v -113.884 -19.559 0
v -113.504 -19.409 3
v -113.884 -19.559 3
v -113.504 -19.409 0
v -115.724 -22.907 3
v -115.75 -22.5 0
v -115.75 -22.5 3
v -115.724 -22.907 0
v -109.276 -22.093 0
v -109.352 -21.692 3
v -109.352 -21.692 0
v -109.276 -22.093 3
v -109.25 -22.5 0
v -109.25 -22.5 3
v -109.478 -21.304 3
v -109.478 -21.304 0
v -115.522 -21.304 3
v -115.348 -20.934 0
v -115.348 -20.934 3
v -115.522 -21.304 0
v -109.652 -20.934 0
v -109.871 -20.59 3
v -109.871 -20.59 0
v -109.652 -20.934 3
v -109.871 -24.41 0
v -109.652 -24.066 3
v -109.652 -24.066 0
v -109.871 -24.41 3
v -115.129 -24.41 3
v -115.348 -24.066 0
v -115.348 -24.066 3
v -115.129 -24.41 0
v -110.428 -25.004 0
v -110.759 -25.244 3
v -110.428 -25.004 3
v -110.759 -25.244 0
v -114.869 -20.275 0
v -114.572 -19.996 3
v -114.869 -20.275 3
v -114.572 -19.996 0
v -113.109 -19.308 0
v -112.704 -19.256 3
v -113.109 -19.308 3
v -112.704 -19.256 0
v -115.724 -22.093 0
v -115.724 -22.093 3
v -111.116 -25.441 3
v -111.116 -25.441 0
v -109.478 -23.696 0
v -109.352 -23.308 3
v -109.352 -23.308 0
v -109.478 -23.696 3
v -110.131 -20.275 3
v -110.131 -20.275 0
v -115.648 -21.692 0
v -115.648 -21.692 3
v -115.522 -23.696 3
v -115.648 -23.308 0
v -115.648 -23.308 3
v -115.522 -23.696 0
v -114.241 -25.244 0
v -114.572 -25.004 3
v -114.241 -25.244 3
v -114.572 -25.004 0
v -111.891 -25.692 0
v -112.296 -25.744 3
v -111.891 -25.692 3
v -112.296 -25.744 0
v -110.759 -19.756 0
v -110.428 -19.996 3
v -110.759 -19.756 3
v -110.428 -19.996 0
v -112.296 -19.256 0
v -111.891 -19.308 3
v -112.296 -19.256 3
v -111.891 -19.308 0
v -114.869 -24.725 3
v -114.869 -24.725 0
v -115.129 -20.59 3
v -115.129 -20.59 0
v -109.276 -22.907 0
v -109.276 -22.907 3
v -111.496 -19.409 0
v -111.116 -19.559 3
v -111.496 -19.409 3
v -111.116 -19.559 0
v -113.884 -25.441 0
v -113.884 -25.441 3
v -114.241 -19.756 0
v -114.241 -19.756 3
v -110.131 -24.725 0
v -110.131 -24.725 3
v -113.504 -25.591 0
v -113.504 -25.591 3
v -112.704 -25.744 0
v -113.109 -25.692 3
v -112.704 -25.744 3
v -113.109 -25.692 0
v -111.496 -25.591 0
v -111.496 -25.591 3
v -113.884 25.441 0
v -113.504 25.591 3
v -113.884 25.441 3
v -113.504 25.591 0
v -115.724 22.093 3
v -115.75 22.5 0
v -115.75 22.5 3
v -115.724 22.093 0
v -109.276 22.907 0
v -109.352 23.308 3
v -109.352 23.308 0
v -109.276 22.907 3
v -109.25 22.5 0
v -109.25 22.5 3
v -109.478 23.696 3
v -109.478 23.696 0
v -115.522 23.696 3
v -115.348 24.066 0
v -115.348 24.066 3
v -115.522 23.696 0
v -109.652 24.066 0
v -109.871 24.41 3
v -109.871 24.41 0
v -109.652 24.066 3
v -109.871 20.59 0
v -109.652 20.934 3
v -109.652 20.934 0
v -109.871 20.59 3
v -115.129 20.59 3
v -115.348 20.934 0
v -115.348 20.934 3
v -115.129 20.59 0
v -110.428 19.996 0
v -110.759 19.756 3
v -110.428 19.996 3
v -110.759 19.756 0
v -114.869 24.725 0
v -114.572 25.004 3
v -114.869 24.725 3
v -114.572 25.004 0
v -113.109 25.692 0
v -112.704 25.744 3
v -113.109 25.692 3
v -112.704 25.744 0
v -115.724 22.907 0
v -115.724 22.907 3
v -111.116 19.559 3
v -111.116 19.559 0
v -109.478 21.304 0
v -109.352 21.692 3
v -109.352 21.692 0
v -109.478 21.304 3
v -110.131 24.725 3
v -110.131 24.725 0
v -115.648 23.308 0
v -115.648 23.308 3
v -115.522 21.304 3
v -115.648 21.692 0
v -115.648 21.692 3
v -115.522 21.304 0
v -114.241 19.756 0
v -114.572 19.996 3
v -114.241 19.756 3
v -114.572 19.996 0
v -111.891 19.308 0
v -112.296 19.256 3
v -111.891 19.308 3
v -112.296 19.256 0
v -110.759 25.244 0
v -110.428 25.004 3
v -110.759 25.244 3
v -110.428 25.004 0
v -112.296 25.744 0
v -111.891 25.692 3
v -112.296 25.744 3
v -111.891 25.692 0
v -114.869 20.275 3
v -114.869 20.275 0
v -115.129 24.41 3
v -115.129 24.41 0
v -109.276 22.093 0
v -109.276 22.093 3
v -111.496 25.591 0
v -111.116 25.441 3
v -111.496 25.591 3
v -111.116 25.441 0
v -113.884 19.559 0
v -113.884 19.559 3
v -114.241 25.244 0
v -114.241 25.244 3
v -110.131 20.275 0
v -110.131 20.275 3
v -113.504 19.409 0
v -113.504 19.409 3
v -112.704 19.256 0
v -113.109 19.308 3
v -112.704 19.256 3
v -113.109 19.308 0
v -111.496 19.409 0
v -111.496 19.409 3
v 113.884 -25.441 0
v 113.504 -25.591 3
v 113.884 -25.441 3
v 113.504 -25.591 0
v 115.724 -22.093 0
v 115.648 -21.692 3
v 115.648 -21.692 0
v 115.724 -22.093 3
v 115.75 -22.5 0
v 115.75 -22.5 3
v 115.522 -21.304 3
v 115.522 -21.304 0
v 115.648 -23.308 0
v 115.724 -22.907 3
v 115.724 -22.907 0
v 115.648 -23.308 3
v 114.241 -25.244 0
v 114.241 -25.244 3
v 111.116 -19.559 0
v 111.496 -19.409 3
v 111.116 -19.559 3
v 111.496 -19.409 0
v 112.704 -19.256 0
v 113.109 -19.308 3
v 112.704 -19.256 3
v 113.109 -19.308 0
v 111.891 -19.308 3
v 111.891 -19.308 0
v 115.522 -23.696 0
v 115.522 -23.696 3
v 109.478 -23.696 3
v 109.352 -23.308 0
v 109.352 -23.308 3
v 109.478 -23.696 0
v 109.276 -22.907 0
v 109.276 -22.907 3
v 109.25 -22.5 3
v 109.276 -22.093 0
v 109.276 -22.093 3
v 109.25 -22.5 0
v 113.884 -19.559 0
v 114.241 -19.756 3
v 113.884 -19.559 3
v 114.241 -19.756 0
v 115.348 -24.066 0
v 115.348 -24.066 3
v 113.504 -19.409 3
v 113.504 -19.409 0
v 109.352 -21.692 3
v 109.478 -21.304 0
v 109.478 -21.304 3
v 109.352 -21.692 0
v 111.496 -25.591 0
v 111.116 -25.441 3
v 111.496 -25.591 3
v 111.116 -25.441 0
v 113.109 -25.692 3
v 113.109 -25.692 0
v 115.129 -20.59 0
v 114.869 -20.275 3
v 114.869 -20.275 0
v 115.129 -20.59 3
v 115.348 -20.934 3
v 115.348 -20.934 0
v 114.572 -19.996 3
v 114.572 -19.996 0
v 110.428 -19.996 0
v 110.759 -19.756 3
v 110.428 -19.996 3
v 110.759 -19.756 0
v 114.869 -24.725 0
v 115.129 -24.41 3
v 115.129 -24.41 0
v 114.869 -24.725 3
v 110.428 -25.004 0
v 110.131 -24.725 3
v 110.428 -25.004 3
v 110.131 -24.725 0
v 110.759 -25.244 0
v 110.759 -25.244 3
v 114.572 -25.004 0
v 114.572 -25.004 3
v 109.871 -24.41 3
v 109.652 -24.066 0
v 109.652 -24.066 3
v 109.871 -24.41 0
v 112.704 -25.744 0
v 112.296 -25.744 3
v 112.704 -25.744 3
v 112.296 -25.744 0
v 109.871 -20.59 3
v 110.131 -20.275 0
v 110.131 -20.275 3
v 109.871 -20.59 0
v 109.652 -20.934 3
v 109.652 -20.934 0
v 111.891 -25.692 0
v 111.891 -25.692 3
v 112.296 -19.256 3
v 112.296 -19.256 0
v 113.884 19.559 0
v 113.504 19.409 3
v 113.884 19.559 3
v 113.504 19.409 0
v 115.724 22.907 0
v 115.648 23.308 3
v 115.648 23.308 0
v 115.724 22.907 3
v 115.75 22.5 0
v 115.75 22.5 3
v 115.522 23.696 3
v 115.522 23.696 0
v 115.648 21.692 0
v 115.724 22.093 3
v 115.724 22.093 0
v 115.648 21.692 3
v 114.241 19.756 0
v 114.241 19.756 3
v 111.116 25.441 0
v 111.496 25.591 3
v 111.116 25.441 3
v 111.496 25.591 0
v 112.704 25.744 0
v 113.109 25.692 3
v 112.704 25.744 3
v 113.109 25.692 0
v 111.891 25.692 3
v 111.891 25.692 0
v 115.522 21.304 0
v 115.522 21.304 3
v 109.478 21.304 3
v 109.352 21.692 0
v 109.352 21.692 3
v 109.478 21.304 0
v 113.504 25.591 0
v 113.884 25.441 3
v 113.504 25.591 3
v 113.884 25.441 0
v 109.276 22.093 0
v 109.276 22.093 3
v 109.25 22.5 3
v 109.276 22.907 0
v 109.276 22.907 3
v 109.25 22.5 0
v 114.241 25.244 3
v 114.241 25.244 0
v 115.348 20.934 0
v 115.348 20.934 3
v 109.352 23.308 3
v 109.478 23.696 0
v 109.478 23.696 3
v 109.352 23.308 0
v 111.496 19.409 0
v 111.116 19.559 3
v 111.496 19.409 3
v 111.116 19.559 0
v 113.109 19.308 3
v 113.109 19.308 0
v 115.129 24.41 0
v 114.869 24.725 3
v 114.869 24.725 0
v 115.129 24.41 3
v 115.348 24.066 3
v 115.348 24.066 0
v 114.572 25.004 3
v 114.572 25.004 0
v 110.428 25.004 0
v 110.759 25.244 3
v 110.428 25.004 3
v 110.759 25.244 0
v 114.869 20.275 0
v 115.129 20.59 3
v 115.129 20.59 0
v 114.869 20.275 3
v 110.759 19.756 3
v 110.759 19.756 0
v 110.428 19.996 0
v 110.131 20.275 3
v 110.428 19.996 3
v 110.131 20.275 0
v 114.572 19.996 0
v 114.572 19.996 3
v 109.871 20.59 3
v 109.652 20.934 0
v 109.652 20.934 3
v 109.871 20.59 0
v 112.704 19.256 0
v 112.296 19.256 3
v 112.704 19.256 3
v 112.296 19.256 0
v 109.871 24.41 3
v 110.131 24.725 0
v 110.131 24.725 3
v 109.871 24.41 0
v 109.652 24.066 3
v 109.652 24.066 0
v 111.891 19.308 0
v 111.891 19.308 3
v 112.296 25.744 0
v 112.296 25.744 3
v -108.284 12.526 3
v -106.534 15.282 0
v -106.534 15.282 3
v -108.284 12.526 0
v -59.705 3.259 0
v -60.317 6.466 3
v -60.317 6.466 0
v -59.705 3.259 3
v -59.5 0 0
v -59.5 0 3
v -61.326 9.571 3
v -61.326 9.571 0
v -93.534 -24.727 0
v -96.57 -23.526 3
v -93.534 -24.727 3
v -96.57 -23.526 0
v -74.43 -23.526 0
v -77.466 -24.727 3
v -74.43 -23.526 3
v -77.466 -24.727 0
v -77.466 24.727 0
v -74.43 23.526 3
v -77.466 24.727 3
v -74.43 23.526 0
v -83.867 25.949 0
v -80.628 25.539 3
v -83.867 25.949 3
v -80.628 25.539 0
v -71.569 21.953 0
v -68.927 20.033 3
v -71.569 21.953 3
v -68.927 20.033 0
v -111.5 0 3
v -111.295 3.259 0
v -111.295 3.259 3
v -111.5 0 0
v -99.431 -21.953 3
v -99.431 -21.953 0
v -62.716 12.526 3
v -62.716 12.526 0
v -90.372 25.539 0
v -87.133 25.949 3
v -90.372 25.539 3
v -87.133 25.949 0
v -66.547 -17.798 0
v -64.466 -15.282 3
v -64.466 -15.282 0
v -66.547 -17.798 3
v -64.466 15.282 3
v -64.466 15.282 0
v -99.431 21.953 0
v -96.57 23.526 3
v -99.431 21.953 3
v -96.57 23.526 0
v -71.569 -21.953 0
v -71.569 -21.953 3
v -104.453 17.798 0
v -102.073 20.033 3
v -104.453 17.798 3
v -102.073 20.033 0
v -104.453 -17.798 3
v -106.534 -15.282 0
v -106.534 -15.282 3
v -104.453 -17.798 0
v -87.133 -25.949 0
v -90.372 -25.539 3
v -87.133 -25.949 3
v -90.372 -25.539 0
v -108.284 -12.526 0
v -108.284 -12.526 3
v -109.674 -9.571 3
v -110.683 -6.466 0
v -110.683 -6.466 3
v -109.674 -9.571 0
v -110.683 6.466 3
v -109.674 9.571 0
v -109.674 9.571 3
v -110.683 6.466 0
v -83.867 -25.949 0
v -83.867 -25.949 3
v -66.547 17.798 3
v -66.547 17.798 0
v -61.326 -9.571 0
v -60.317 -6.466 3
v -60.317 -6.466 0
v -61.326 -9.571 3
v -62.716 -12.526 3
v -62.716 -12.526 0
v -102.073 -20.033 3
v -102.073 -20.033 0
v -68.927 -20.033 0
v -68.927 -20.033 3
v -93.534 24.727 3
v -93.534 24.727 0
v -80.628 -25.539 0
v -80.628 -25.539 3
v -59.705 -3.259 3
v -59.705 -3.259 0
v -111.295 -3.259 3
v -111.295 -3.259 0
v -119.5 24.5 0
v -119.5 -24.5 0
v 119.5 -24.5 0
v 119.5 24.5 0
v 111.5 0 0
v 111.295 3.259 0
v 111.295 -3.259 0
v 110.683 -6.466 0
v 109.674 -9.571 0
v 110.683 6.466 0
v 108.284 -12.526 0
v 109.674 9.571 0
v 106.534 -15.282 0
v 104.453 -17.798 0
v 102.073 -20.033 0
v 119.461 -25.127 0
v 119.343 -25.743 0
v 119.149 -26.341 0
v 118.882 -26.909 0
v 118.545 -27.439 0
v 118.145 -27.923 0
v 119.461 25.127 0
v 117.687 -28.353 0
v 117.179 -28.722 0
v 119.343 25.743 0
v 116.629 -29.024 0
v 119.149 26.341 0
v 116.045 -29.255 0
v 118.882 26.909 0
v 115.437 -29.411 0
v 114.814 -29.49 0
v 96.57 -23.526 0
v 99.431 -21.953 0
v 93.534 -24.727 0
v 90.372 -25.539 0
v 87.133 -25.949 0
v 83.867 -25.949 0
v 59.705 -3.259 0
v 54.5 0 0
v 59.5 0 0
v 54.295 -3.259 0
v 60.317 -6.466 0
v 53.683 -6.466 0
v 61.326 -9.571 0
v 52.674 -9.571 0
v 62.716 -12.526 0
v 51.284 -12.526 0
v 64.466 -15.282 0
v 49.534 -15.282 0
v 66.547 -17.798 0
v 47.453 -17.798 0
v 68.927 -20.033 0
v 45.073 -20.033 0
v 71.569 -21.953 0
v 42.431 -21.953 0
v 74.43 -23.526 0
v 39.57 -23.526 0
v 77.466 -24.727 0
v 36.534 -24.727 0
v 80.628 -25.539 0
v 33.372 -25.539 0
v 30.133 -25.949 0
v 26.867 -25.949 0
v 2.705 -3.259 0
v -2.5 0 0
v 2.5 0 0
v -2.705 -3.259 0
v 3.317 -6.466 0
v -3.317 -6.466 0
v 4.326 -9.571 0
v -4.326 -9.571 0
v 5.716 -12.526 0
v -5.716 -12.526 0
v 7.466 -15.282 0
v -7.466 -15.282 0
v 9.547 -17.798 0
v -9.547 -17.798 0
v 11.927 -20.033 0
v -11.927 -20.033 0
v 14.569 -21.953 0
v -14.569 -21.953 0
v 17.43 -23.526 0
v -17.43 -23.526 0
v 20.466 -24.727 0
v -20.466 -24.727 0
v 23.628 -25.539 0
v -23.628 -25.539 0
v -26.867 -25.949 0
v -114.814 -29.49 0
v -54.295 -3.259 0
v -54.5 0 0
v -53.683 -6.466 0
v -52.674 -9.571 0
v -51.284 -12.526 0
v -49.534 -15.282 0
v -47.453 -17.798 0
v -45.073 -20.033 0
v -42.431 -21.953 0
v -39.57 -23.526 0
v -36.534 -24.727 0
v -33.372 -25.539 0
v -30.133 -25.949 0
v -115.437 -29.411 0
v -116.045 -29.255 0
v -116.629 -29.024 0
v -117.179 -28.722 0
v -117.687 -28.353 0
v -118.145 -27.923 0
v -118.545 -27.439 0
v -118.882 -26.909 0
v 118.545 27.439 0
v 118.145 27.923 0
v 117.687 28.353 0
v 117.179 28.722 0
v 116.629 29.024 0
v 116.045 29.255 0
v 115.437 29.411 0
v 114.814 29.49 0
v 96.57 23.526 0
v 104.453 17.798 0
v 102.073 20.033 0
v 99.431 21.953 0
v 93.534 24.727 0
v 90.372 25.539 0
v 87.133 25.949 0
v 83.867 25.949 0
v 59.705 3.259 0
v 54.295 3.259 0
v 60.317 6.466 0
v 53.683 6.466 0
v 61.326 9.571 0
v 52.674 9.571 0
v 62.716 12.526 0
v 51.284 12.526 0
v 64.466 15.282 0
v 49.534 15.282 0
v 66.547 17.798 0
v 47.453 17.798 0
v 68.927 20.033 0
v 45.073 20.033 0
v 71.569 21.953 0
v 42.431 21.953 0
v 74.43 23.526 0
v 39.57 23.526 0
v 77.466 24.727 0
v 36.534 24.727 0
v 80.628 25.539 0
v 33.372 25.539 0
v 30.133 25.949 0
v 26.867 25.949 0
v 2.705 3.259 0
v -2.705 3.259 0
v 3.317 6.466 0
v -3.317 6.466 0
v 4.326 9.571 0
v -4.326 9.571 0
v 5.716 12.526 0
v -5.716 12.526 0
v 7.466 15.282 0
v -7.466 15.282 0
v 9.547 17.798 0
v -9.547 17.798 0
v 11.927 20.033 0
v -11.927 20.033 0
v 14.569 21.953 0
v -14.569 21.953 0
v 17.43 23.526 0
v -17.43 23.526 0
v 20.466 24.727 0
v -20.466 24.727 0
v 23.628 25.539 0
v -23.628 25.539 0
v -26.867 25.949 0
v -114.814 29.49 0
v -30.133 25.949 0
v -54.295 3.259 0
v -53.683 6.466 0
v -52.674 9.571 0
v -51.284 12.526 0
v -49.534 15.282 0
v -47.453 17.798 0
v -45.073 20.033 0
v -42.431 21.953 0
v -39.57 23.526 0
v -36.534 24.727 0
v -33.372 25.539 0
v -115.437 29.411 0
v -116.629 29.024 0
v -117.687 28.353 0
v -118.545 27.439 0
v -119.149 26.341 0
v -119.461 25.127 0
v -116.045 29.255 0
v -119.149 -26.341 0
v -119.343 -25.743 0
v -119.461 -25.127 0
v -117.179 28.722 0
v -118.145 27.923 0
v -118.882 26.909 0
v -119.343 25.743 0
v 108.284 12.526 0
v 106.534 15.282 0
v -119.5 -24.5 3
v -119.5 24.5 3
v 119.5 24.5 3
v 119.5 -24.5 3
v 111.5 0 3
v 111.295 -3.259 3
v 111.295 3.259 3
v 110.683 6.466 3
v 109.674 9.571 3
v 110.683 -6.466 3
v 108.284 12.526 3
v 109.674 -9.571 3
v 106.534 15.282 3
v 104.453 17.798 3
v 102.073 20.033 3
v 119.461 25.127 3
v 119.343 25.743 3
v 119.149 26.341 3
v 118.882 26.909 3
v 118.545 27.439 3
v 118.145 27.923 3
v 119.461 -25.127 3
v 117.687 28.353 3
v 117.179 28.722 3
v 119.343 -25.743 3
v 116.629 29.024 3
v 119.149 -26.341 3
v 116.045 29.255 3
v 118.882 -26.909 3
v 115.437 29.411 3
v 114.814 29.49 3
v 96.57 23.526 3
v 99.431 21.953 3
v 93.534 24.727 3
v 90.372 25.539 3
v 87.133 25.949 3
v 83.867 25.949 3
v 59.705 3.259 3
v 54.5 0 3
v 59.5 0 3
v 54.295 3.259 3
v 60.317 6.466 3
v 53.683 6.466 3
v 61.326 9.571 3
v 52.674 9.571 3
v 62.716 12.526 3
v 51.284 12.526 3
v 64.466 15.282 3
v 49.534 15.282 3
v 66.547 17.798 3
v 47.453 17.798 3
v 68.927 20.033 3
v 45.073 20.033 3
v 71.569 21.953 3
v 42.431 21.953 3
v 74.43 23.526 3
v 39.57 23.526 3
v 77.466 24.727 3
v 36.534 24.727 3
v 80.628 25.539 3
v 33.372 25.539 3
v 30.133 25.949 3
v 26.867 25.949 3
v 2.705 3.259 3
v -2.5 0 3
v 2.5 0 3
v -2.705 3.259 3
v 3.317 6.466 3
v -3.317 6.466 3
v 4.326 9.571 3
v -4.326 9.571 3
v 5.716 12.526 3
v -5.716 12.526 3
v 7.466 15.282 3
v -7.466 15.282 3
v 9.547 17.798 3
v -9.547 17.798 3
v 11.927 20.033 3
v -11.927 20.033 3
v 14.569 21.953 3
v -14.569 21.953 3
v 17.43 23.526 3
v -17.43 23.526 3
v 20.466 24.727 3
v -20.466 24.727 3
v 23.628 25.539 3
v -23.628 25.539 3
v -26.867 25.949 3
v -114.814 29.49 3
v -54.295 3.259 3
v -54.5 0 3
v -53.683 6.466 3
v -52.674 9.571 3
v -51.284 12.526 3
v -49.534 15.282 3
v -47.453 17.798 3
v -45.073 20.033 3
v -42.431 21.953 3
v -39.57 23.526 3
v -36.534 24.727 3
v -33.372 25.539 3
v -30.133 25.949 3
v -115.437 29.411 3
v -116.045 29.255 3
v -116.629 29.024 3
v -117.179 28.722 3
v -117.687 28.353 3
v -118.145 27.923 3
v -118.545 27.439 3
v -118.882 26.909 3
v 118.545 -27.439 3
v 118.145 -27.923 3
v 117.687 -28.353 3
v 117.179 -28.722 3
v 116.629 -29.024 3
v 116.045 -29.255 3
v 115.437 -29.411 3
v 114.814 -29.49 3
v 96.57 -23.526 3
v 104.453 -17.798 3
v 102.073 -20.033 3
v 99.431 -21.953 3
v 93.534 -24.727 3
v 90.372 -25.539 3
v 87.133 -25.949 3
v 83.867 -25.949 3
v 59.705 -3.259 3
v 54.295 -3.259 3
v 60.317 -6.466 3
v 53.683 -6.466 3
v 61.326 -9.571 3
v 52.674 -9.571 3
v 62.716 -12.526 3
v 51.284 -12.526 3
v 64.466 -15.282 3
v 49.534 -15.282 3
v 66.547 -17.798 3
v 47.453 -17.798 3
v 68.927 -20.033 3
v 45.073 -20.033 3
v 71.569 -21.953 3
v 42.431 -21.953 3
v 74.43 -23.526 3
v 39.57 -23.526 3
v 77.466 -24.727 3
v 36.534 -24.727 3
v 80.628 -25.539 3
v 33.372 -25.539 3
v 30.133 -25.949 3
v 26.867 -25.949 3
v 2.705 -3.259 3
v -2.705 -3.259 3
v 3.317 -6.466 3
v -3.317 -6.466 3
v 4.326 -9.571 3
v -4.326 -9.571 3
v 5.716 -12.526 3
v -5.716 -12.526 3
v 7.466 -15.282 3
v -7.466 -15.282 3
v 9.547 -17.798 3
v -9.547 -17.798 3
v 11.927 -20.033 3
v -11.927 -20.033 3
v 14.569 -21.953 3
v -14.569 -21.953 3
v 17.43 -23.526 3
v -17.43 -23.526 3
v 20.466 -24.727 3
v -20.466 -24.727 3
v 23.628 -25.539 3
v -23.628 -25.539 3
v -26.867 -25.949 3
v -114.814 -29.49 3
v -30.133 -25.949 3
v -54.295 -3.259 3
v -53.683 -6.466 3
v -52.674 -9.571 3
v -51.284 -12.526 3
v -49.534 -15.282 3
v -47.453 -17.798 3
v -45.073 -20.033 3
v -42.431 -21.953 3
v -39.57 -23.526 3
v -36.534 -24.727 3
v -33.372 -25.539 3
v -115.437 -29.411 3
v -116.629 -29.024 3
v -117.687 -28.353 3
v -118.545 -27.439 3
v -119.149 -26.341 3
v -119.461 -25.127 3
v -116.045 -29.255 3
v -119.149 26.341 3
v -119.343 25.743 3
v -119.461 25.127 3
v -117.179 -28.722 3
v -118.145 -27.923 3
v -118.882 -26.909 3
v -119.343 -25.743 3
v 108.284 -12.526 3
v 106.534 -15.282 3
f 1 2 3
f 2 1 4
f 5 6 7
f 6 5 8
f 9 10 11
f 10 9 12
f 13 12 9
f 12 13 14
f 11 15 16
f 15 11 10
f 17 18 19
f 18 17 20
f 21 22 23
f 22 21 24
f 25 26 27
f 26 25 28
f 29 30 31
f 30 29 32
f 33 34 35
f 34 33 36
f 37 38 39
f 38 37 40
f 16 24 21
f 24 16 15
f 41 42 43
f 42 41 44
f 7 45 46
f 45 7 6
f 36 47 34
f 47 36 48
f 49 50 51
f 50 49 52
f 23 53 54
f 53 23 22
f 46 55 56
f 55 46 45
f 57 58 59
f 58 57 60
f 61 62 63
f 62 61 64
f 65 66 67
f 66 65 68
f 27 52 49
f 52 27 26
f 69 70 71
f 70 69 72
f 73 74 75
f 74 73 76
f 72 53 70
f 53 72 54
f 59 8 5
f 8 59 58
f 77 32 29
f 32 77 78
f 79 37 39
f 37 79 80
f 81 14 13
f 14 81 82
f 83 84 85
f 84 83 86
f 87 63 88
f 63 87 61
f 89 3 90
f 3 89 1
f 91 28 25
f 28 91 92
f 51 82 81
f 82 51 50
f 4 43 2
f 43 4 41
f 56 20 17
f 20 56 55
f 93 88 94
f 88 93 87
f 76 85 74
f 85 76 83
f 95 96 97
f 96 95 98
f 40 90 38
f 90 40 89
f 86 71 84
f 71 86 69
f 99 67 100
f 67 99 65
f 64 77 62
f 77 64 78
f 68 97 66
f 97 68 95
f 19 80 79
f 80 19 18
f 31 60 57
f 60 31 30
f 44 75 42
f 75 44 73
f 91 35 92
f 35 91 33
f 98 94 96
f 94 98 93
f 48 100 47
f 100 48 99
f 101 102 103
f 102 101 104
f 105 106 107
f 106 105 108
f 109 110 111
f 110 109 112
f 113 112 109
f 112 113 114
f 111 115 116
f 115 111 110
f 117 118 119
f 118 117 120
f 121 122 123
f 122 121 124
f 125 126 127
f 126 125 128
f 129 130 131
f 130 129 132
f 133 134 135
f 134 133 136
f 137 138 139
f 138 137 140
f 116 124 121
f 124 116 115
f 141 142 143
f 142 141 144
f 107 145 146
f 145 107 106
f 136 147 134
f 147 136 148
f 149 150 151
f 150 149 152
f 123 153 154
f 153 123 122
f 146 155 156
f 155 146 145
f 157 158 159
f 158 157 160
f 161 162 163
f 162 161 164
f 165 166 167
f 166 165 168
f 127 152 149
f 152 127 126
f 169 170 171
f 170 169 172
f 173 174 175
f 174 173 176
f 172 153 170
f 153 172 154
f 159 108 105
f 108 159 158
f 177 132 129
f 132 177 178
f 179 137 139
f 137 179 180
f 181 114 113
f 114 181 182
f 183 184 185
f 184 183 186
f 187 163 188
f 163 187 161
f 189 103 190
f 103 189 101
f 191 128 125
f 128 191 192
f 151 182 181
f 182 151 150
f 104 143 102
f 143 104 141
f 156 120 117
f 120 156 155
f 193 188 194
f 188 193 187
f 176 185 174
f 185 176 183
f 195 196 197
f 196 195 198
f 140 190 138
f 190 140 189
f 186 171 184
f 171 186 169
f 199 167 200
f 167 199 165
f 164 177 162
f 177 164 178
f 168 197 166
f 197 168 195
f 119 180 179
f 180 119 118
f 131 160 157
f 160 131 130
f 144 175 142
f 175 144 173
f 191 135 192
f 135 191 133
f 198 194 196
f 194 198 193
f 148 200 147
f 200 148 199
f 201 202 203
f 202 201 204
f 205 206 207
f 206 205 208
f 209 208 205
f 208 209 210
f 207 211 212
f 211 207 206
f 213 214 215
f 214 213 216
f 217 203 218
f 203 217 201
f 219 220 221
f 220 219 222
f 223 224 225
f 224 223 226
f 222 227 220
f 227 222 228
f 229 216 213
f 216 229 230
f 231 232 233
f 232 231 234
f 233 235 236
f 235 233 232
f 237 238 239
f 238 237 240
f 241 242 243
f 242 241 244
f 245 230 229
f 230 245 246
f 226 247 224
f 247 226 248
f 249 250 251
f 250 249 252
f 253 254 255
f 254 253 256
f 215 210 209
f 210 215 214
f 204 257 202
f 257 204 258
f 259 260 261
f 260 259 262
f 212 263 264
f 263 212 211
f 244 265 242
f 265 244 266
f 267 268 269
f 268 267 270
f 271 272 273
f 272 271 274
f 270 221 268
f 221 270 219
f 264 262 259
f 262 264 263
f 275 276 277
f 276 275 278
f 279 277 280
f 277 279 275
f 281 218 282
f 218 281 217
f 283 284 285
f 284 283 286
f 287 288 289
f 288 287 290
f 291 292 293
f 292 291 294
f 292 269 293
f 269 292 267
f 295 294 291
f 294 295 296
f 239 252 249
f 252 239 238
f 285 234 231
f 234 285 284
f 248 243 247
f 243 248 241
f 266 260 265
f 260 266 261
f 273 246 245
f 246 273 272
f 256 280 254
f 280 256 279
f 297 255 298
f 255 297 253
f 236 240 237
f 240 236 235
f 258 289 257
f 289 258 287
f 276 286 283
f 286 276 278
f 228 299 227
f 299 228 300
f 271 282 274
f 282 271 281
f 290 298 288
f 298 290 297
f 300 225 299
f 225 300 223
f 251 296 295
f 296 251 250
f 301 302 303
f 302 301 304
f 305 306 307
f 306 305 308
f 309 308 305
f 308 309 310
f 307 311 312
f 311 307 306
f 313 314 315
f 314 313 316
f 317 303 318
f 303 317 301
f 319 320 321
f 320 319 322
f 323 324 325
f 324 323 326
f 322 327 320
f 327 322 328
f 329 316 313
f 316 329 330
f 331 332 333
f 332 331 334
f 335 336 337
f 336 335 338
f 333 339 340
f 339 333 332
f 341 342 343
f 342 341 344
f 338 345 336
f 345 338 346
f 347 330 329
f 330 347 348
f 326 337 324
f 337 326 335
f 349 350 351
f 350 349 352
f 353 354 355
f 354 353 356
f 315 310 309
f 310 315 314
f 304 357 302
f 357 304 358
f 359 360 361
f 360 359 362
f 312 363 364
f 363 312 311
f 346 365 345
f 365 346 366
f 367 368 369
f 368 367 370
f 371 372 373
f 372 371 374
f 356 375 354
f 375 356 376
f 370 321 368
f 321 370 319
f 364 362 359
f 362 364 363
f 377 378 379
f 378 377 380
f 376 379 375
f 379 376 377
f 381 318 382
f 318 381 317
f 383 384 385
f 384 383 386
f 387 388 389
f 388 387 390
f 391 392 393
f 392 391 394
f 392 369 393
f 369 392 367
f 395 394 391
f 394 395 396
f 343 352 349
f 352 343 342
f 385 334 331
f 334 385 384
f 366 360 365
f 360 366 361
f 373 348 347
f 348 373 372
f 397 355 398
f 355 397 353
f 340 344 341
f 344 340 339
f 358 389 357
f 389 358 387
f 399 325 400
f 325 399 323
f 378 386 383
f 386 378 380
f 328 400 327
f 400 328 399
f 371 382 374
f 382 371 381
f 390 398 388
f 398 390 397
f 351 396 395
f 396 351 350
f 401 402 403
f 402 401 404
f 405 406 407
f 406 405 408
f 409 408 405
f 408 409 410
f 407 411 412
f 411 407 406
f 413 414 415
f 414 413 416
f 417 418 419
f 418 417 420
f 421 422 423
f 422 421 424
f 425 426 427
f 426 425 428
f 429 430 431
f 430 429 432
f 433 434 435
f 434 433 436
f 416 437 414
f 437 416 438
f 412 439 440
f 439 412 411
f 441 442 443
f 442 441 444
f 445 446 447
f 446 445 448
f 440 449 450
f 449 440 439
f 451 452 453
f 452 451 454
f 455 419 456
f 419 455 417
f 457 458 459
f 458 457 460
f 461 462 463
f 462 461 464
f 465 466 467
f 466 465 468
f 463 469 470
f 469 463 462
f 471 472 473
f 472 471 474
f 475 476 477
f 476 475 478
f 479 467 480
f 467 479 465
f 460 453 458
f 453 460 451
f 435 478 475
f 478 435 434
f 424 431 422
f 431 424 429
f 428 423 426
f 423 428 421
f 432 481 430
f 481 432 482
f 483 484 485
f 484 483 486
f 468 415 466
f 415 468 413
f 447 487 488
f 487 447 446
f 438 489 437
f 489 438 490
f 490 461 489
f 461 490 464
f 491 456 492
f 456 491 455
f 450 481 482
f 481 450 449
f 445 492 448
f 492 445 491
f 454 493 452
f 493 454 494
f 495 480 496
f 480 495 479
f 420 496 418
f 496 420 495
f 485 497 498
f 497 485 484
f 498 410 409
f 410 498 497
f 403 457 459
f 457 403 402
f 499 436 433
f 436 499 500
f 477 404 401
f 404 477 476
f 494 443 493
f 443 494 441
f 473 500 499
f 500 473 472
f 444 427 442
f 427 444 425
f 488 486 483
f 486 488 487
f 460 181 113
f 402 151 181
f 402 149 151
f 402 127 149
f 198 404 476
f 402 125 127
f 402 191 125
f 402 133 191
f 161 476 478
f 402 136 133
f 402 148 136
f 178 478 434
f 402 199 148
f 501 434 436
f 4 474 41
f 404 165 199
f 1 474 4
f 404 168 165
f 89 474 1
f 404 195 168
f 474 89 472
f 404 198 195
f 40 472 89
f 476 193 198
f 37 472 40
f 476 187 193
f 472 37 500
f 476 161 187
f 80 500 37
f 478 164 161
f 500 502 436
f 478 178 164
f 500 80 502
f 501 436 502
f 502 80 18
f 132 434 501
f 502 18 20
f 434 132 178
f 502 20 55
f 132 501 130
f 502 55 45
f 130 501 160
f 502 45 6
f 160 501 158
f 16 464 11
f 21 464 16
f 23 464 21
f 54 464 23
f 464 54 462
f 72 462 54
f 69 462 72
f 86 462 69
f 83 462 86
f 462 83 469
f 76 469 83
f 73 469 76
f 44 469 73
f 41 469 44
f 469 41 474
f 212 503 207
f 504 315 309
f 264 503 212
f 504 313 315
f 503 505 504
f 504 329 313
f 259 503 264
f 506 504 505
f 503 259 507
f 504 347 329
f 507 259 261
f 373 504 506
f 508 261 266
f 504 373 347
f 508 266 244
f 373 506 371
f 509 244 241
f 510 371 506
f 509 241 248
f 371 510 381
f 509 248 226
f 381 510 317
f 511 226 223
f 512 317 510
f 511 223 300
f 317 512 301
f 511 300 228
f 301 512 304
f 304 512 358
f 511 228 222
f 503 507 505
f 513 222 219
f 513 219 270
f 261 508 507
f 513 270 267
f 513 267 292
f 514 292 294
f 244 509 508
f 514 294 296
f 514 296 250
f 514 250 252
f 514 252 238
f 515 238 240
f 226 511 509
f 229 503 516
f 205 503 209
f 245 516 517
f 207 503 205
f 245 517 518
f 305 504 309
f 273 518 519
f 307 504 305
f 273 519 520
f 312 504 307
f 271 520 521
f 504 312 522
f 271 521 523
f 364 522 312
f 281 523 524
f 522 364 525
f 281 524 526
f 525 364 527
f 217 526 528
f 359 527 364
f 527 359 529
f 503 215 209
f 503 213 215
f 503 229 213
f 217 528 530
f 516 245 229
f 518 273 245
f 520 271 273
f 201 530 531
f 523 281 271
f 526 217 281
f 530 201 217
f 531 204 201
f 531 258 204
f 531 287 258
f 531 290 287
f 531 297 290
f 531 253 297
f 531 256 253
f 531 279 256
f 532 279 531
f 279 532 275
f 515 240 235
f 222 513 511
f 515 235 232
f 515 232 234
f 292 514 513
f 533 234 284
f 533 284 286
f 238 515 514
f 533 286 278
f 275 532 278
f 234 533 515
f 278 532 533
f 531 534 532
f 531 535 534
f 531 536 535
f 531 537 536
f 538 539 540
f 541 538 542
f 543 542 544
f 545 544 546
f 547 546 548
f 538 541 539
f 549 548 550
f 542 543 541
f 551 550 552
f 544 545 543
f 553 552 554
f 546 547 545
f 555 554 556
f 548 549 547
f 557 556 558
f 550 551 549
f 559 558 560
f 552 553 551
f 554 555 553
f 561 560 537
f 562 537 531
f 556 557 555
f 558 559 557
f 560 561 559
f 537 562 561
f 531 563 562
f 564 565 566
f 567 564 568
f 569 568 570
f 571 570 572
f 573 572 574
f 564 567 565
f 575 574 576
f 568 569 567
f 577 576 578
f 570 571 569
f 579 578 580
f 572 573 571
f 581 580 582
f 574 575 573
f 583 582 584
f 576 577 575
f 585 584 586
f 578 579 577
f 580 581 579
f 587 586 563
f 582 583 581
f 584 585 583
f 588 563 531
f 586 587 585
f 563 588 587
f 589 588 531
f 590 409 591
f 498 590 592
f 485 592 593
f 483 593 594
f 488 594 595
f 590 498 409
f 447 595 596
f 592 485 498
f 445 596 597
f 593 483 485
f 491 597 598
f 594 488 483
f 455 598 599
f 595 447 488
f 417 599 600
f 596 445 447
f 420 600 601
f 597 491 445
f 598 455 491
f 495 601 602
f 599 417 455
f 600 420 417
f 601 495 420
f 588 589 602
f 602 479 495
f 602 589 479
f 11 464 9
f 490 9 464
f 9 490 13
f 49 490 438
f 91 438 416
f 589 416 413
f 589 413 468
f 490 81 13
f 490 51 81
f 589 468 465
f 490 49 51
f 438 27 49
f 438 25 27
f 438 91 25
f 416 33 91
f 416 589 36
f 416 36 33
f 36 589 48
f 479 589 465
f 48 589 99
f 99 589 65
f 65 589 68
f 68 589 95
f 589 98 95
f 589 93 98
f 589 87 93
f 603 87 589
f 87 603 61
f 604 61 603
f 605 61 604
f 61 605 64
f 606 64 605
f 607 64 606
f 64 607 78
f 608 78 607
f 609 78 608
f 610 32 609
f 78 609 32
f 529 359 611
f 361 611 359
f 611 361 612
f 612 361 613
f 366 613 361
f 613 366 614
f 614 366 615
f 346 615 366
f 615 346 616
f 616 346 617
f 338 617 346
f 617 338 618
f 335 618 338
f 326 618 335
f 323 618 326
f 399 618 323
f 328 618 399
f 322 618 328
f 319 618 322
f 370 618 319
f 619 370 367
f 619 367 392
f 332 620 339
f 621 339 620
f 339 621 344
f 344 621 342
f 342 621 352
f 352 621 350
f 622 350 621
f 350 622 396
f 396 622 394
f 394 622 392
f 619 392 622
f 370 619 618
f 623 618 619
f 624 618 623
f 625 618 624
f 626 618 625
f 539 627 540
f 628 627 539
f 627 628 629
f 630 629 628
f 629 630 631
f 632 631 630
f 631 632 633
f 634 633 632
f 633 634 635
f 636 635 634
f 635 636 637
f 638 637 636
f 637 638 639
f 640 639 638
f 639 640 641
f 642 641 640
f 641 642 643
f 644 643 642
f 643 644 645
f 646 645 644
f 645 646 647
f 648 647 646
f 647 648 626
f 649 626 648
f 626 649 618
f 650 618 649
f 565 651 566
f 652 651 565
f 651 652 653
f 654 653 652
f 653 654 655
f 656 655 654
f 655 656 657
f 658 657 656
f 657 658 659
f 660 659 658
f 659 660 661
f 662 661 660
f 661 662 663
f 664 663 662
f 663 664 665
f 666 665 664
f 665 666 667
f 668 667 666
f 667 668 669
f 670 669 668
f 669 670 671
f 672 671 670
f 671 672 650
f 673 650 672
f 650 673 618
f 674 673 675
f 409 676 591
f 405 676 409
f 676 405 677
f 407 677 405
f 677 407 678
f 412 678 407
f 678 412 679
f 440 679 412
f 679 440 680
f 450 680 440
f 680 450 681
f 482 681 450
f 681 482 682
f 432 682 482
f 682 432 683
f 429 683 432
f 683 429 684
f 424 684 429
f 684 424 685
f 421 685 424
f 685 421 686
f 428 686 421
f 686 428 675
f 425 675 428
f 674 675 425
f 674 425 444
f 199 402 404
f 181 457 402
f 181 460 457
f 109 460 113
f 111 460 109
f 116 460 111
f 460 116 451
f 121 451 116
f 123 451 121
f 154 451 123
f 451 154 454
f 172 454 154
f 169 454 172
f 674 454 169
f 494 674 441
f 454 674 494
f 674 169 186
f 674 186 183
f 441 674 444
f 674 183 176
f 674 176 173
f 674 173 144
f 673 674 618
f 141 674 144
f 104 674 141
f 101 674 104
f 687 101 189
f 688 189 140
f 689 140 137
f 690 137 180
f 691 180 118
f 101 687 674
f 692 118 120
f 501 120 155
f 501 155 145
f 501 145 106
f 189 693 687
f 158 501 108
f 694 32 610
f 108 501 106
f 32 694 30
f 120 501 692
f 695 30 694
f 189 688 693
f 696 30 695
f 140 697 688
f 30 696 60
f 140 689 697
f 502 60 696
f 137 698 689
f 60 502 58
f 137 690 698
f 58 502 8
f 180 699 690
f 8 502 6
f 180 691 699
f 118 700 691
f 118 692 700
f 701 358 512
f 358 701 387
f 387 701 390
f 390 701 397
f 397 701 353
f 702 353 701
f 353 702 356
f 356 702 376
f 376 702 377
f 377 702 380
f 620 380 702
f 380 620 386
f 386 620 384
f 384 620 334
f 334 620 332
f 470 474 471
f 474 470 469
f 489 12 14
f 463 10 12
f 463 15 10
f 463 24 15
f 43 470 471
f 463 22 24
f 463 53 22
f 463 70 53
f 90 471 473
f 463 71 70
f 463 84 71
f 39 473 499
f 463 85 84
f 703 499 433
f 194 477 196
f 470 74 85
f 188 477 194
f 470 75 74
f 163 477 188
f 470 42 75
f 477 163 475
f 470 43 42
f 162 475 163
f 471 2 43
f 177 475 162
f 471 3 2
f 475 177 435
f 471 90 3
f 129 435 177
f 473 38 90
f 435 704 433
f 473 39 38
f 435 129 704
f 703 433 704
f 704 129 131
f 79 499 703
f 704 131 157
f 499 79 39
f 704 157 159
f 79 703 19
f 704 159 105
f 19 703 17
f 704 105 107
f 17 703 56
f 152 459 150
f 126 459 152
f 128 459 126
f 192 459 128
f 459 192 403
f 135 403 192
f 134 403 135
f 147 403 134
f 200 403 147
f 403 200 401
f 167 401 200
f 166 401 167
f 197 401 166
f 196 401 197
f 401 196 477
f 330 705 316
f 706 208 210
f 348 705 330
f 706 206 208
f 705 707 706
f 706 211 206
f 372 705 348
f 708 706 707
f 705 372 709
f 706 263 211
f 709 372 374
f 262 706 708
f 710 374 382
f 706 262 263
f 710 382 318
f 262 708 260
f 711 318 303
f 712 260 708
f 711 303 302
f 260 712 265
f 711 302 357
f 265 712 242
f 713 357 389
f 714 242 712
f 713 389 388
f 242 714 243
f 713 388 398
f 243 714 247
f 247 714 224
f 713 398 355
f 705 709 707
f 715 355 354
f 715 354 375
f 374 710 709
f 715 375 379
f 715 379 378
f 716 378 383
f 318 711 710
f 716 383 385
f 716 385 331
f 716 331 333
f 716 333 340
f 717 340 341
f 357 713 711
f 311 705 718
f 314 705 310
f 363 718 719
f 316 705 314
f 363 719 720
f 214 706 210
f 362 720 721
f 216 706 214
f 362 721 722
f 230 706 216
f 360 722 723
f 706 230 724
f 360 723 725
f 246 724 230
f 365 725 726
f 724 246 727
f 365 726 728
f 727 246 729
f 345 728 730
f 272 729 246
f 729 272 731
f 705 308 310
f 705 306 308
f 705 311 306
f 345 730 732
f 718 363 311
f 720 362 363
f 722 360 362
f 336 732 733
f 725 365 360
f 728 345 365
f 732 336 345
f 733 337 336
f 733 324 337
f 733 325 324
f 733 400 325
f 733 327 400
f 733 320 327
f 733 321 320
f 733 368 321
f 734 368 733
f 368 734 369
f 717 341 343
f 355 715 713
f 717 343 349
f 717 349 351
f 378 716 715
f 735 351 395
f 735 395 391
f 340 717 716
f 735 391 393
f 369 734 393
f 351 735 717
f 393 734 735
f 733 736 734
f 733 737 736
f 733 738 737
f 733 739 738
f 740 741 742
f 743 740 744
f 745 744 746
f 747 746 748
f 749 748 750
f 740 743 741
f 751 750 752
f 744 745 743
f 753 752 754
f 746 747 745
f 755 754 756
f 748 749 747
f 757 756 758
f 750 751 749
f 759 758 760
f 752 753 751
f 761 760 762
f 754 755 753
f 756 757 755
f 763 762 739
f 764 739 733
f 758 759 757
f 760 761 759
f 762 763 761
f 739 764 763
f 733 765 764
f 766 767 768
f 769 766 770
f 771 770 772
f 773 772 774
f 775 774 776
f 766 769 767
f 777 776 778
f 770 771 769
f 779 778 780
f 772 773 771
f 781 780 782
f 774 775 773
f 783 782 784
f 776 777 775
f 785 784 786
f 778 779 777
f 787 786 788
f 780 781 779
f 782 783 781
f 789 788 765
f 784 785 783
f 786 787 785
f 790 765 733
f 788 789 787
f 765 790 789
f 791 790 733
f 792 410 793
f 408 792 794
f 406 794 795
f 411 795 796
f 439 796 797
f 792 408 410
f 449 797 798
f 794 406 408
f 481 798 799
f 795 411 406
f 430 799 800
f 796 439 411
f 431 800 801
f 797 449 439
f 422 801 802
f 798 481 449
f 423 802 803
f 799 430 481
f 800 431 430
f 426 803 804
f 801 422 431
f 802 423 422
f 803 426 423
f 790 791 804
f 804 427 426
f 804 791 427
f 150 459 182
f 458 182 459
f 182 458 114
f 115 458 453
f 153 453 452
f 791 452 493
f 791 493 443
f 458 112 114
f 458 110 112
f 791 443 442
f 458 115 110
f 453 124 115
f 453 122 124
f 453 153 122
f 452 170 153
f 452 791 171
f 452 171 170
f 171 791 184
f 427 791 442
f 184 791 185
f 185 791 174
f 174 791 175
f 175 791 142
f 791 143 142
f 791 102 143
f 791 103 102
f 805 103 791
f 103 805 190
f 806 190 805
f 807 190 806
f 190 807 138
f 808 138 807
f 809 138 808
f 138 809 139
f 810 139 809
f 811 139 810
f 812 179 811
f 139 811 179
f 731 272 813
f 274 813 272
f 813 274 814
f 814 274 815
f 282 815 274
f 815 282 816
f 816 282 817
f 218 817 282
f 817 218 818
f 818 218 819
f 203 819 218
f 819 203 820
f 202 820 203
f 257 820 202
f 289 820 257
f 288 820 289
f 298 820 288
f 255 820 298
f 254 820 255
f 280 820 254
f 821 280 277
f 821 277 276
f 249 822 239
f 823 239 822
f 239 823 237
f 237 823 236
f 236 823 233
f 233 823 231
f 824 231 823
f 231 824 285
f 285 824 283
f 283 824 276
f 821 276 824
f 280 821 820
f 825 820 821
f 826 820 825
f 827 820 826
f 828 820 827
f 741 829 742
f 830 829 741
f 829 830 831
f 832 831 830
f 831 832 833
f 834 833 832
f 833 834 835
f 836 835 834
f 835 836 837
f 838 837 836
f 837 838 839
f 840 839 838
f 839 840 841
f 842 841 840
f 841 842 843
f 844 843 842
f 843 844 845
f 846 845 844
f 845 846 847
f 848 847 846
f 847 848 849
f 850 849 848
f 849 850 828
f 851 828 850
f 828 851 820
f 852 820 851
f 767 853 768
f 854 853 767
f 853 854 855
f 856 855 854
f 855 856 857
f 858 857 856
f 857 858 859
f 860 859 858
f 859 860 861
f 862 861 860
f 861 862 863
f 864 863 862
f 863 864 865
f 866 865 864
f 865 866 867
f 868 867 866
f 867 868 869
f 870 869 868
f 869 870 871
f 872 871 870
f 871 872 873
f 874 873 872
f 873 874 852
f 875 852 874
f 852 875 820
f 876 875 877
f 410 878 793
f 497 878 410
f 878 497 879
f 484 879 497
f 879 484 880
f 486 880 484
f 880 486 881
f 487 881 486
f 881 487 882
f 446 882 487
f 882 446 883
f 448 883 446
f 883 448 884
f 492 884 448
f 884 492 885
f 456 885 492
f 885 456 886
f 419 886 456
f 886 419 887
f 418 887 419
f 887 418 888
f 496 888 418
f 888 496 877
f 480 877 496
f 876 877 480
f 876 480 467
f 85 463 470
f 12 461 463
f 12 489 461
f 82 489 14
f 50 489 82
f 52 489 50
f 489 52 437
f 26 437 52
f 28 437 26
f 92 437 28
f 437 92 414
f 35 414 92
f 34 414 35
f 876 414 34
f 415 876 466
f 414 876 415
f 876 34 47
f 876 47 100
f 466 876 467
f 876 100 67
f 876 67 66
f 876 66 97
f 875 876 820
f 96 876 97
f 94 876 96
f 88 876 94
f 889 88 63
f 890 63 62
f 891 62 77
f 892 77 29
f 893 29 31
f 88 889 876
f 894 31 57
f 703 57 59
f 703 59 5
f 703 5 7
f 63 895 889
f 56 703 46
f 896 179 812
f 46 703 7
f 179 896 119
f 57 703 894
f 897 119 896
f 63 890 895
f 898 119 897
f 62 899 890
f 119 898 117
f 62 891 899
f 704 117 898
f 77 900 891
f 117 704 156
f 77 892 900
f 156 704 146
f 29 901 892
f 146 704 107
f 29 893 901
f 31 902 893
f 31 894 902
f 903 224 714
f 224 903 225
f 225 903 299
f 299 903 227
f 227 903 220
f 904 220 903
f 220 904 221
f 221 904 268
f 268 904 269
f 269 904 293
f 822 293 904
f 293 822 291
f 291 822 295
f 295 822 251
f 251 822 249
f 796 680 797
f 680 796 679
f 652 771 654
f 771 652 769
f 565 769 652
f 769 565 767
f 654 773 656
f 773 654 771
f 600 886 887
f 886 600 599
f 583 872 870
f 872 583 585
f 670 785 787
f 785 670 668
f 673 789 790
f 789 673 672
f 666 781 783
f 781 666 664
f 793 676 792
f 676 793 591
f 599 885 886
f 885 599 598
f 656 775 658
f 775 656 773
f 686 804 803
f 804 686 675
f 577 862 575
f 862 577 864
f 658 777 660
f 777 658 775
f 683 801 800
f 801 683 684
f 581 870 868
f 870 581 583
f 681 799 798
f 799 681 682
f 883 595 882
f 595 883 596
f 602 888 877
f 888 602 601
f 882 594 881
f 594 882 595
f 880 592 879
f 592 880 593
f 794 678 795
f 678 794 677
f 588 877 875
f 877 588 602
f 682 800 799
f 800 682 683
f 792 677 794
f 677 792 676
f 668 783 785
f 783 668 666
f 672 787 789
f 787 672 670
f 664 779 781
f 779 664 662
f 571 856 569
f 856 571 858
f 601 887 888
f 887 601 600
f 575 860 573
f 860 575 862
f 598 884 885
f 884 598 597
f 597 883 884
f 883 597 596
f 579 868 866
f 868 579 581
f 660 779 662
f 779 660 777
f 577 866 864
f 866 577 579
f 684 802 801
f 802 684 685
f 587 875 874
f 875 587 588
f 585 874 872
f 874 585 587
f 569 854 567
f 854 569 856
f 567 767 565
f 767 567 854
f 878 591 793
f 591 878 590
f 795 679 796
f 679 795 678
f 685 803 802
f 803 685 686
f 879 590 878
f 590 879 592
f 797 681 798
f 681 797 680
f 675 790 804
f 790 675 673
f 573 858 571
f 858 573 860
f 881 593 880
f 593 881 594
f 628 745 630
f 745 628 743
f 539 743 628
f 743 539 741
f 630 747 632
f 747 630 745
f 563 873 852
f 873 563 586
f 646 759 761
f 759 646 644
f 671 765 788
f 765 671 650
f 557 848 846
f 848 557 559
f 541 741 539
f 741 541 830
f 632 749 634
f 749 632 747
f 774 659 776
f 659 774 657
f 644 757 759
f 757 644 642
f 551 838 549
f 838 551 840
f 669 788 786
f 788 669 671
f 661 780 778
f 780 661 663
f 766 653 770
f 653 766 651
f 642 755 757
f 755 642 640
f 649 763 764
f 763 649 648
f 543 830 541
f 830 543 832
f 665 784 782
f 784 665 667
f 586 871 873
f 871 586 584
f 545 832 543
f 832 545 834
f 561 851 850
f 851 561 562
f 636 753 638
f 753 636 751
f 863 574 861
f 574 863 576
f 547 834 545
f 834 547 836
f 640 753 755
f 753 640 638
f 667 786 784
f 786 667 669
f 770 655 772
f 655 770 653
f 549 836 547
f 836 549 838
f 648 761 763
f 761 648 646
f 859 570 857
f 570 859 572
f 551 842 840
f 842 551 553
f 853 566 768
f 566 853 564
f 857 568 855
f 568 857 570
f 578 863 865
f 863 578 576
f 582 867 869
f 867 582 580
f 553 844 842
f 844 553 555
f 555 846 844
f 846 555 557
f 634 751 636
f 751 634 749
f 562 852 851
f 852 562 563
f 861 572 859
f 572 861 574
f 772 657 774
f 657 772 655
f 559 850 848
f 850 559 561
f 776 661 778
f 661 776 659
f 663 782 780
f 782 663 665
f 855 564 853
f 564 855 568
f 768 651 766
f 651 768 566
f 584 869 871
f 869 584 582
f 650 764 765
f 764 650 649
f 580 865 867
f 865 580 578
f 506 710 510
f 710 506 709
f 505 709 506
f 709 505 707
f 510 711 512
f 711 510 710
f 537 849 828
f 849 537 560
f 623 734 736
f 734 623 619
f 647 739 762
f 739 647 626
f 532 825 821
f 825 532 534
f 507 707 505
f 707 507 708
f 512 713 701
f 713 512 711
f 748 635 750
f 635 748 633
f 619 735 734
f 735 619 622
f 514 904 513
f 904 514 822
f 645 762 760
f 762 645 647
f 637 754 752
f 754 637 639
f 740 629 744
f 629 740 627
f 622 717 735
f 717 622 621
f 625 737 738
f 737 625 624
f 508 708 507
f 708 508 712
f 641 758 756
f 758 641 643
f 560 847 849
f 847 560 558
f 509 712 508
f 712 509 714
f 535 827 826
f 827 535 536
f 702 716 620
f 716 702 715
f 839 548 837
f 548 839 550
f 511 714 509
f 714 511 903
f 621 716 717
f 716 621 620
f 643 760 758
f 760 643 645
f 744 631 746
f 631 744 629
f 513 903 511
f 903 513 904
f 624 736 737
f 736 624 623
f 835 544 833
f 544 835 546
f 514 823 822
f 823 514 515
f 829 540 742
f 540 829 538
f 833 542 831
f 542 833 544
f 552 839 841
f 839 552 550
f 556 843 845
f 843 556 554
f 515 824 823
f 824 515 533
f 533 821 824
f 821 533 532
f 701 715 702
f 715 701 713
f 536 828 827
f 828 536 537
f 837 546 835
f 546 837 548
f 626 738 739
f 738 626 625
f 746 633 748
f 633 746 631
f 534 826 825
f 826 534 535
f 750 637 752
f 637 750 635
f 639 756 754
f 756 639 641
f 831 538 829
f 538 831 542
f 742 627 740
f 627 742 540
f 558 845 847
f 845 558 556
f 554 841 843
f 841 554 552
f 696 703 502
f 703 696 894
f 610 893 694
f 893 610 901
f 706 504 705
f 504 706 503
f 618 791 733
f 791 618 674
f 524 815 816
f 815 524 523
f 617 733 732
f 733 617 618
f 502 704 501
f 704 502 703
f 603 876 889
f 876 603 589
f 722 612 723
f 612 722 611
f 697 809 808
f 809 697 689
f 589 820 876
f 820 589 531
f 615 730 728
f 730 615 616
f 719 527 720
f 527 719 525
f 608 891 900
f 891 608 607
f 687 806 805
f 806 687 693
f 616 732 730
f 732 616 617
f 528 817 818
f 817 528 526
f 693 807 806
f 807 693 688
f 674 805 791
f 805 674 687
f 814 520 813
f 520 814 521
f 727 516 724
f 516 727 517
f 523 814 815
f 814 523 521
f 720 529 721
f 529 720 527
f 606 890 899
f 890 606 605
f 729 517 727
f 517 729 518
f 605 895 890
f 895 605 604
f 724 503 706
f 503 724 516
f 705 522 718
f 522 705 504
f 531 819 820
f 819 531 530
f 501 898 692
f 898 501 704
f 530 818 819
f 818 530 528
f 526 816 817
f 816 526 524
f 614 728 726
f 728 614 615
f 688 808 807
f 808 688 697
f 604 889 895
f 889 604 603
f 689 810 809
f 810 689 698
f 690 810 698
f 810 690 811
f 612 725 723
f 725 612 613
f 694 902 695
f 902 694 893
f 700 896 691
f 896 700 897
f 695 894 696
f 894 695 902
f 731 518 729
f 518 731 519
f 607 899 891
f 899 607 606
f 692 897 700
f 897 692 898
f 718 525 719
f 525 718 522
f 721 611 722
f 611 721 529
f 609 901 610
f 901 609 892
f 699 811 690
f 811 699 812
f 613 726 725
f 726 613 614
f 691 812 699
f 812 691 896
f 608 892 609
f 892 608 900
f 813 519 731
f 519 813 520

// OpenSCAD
$fn = 50;


difference() {
	union() {
		hull() {
			translate(v = [-114.5000000000, 24.5000000000, 0]) {
				cylinder(h = 3, r = 5);
			}
			translate(v = [114.5000000000, 24.5000000000, 0]) {
				cylinder(h = 3, r = 5);
			}
			translate(v = [-114.5000000000, -24.5000000000, 0]) {
				cylinder(h = 3, r = 5);
			}
			translate(v = [114.5000000000, -24.5000000000, 0]) {
				cylinder(h = 3, r = 5);
			}
		}
	}
	union() {
		#translate(v = [-112.5000000000, -22.5000000000, -100.0000000000]) {
			cylinder(h = 200, r = 3.2500000000);
		}
		#translate(v = [-112.5000000000, 22.5000000000, -100.0000000000]) {
			cylinder(h = 200, r = 3.2500000000);
		}
		#translate(v = [112.5000000000, -22.5000000000, -100.0000000000]) {
			cylinder(h = 200, r = 3.2500000000);
		}
		#translate(v = [112.5000000000, 22.5000000000, -100.0000000000]) {
			cylinder(h = 200, r = 3.2500000000);
		}
		#translate(v = [-85.5000000000, 0, 0]) {
			cylinder(h = 3, r = 26.0000000000);
		}
		#translate(v = [-28.5000000000, 0, 0]) {
			cylinder(h = 3, r = 26.0000000000);
		}
		#translate(v = [28.5000000000, 0, 0]) {
			cylinder(h = 3, r = 26.0000000000);
		}
		#translate(v = [85.5000000000, 0, 0]) {
			cylinder(h = 3, r = 26.0000000000);
		}
	}
}
